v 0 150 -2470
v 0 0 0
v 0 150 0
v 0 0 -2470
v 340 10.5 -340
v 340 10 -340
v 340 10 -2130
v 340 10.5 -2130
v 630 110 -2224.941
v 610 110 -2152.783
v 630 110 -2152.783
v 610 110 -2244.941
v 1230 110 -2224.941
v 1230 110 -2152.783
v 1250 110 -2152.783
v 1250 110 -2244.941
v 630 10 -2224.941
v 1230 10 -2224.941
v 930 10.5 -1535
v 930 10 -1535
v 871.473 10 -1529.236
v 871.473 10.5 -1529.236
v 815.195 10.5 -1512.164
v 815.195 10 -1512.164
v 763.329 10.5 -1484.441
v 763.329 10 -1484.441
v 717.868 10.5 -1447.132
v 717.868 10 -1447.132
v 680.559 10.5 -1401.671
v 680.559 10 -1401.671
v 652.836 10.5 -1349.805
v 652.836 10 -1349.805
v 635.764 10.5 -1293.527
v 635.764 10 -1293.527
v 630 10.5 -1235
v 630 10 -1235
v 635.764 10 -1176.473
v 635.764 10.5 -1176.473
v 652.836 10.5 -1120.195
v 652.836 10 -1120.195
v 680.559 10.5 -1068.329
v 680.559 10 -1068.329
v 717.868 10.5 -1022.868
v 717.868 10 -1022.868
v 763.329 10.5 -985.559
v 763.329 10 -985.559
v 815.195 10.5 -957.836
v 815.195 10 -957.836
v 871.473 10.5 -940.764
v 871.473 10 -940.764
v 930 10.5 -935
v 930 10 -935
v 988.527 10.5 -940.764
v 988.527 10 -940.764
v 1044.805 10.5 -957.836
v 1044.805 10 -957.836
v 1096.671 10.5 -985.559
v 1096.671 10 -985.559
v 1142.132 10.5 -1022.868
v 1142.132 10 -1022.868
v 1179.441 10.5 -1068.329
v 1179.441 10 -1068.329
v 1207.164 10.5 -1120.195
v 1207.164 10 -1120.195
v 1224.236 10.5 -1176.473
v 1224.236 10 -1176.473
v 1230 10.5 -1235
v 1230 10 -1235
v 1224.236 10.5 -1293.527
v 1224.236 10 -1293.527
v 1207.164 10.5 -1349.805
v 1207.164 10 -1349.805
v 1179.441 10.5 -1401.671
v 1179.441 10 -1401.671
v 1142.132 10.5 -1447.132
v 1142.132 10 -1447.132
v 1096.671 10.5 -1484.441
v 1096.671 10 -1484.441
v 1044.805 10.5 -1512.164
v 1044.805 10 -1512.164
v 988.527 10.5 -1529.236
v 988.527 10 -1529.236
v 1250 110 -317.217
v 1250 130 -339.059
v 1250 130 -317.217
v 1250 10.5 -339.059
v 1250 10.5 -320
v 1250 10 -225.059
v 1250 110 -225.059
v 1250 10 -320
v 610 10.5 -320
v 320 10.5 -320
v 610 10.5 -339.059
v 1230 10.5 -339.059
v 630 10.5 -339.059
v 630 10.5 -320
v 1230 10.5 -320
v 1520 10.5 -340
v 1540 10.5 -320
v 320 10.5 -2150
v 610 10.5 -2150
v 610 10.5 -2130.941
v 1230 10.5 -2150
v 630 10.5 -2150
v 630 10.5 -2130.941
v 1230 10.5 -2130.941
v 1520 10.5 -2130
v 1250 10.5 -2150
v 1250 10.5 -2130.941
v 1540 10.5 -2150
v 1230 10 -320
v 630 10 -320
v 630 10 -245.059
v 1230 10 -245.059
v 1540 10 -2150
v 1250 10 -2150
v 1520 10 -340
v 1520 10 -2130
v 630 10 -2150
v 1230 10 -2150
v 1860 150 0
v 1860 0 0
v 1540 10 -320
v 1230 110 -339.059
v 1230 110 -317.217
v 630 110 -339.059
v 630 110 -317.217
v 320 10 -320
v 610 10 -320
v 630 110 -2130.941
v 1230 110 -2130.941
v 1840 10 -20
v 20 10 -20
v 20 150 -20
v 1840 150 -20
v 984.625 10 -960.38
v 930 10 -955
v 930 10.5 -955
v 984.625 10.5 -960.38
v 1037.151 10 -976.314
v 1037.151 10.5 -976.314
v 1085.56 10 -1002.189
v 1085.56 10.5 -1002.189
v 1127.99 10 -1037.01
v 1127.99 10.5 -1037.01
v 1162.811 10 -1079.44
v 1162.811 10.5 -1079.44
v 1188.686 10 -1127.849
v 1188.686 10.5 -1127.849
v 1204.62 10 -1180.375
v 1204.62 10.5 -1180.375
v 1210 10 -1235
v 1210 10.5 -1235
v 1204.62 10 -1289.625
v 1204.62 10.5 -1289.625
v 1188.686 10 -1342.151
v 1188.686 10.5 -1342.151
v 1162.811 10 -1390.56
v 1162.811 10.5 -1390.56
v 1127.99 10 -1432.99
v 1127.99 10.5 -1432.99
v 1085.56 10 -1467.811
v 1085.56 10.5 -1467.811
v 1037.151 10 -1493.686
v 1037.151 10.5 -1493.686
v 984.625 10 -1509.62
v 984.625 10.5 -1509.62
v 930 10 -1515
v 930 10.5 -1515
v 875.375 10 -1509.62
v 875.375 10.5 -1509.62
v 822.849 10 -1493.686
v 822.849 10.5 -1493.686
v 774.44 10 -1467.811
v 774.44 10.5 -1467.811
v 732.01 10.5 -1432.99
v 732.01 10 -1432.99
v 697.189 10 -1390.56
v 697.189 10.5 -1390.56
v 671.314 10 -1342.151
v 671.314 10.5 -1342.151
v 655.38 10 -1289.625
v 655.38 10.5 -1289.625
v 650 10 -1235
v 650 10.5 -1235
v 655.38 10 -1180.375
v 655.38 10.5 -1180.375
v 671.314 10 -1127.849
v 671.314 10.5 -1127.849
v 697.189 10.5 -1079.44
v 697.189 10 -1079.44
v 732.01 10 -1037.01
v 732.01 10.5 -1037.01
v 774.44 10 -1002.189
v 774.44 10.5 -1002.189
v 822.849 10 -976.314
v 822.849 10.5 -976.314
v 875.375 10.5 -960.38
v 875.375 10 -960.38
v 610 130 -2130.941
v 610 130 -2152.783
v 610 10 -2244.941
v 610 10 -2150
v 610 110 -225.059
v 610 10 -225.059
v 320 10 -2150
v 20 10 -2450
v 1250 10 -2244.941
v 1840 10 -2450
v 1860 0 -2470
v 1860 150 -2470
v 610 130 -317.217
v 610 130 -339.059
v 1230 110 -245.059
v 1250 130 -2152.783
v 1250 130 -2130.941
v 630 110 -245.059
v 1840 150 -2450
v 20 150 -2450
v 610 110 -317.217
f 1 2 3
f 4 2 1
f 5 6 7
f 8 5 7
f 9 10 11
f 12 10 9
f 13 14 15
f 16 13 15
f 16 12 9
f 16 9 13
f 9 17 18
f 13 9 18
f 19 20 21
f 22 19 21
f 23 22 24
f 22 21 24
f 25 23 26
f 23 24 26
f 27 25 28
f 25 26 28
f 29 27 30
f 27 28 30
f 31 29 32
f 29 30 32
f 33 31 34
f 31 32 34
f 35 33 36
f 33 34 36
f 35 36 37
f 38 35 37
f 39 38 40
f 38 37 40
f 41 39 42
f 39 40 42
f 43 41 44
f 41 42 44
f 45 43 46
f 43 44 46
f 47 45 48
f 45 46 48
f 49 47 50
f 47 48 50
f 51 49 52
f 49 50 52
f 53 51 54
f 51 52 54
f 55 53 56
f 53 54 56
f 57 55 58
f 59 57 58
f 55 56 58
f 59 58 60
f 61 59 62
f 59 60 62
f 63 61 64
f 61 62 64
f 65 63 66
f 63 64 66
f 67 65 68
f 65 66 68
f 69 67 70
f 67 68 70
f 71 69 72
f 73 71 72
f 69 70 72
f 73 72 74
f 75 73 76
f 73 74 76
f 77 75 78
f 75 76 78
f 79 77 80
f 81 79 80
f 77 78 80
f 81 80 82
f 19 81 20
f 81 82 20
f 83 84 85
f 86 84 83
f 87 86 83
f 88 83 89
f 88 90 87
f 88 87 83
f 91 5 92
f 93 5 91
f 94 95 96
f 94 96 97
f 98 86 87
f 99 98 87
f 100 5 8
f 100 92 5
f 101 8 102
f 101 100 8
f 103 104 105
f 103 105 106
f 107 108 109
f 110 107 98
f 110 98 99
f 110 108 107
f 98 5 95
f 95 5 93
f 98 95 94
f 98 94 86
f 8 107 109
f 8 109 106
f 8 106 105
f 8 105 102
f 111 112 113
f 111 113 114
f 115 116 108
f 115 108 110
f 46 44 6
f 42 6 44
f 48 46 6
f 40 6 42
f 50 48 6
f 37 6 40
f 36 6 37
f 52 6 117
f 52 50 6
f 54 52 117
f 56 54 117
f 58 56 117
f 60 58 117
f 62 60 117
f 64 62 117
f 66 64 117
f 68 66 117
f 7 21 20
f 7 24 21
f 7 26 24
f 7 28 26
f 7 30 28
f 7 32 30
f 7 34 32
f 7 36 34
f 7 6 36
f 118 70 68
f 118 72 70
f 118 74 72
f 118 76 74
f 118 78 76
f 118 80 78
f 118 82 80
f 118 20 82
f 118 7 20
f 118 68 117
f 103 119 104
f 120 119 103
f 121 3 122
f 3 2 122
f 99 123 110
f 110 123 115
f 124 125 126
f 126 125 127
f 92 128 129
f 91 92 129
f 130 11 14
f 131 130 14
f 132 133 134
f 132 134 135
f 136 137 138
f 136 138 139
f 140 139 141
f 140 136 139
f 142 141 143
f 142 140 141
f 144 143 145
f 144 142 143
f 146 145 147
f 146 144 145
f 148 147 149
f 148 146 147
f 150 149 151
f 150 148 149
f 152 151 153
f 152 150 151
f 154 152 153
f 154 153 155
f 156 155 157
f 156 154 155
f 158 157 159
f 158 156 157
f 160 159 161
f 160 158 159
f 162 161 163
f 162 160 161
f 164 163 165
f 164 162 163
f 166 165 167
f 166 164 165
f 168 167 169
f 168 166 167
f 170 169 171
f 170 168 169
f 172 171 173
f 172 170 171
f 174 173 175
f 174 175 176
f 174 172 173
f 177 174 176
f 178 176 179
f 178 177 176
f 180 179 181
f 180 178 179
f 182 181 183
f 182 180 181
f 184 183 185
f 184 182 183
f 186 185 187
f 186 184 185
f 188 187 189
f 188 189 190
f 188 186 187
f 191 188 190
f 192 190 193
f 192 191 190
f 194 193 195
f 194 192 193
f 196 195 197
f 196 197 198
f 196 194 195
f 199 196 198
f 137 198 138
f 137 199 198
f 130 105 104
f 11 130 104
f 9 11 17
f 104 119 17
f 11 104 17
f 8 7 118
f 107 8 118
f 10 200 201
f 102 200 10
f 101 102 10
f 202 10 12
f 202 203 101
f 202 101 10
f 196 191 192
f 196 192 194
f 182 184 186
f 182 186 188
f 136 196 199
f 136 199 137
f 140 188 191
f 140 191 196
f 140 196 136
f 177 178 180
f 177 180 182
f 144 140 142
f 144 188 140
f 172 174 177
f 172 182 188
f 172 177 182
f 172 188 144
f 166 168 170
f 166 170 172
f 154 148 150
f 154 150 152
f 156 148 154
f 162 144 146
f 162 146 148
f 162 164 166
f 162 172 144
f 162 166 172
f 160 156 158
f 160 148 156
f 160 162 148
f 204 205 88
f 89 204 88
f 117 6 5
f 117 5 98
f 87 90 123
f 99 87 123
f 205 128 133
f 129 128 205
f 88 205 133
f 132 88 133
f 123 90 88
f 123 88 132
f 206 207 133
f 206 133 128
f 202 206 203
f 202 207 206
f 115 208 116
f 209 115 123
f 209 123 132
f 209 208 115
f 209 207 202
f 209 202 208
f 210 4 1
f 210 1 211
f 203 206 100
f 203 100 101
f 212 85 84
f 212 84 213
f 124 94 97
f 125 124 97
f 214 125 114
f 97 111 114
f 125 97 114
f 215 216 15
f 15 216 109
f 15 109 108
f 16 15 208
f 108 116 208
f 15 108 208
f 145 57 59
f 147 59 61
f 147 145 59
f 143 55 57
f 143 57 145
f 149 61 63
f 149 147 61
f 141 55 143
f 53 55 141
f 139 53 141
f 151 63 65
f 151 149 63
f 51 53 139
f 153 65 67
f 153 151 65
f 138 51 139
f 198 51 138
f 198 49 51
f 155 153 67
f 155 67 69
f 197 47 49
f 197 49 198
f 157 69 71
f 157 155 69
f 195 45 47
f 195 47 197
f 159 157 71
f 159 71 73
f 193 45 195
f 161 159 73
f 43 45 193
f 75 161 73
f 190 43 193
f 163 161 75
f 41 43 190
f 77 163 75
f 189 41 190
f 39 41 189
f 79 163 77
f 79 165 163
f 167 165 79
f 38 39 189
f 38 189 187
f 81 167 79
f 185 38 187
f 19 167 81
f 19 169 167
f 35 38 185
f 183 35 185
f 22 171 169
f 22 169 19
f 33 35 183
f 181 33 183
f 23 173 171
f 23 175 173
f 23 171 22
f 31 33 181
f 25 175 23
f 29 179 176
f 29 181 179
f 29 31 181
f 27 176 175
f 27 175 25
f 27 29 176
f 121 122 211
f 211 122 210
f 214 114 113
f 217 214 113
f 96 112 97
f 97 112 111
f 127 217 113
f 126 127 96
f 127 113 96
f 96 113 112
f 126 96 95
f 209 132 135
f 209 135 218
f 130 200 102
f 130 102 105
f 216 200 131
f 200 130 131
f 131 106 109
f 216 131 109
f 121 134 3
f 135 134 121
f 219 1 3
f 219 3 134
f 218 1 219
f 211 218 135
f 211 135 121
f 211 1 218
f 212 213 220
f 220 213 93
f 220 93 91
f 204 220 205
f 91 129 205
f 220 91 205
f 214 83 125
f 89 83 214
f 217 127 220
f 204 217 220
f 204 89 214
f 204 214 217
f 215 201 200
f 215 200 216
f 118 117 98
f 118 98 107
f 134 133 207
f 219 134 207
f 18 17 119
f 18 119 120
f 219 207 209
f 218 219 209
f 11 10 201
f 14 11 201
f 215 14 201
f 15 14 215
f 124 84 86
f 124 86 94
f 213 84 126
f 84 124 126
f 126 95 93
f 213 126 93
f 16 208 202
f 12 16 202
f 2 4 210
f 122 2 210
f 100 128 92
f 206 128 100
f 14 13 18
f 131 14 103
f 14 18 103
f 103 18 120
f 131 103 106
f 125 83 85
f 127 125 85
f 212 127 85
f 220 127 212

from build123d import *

# Parameters (mm, degrees)
ESBO_O1_W                = 1860
ESBO_O1_H                = 2470
RESSALTO_EXTRUS_O1_DEPTH = 10
ESBO_O2_W                = 1860
ESBO_O2_H                = 2470
ESBO_O2_W_2              = 1820
ESBO_O2_H_2              = 2430
RESSALTO_EXTRUS_O2_DEPTH = 140
ESBO_O3_W                = 1220
ESBO_O3_H                = 1830
ESBO_O3_W_2              = 1180
ESBO_O3_H_2              = 1790
ESBO_O3_R                = 300
ESBO_O3_R_2              = 280
RESSALTO_EXTRUS_O3_DEPTH = 0.5
RESSALTO_EXTRUS_O4_DEPTH = 100
ESBO_O5_W                = 640
ESBO_O5_H                = 21.841865424
RESSALTO_EXTRUS_O5_DEPTH = 20
PADR_OCIRCULAR1_COUNT    = 2


with BuildPart() as part:
    # Esboço1 → Ressalto-extrusão1 (new body)
    with BuildSketch(Plane(origin=(0, 0, 0), x_dir=(1, 0, 0), z_dir=(0, 1, 0))):
        with Locations((930, 1235)):
            Rectangle(ESBO_O1_W, ESBO_O1_H)
    extrude(amount=RESSALTO_EXTRUS_O1_DEPTH)

    # Esboço2 → Ressalto-extrusão2 (add)
    with BuildSketch(Plane(origin=(0, 10, 0), x_dir=(1, 0, 0), z_dir=(0, 1, 0))):
        with Locations((930, 1235)):
            Rectangle(ESBO_O2_W, ESBO_O2_H)
        with Locations((930, 1235)):
            Rectangle(ESBO_O2_W_2, ESBO_O2_H_2, mode=Mode.SUBTRACT)
    extrude(amount=RESSALTO_EXTRUS_O2_DEPTH)

    # Esboço3 → Ressalto-extrusão3 (add)
    # profile 1 of 2: a face of its own
    with BuildSketch(Plane(origin=(0, 10, 0), x_dir=(1, 0, 0), z_dir=(0, 1, 0))):
        with Locations((930, 1235)):
            Rectangle(ESBO_O3_W, ESBO_O3_H)
        with Locations((930, 1235)):
            Rectangle(ESBO_O3_W_2, ESBO_O3_H_2, mode=Mode.SUBTRACT)
    # profile 2 of 2: a face of its own
    with BuildSketch(Plane(origin=(0, 10, 0), x_dir=(1, 0, 0), z_dir=(0, 1, 0))):
        with Locations(Location((930, 1235, 0), (0, 0, 90))):
            Circle(ESBO_O3_R)
        with Locations(Location((930, 1235, 0), (0, 0, 270))):
            Circle(ESBO_O3_R_2, mode=Mode.SUBTRACT)
    extrude(amount=RESSALTO_EXTRUS_O3_DEPTH)

    # Esboço4 → Ressalto-extrusão4 (add)
    with BuildSketch(Plane(origin=(0, 10, 0), x_dir=(1, 0, 0), z_dir=(0, 1, 0))):
        Polygon((630, 2224.941322865), (1230, 2224.941322865), (1230, 2150.941322865), (1230, 2130.941322865), (1250, 2130.941322865), (1250, 2244.941322865), (610, 2244.941322865), (610, 2130.941322865), (630, 2130.941322865), (630, 2150.941322865), align=None)
    ressalto_extrus_o4 = extrude(amount=RESSALTO_EXTRUS_O4_DEPTH)

    # Esboço5 → Ressalto-extrusão5 (add)
    with BuildSketch(Plane(origin=(0, 110, 0), x_dir=(1, 0, 0), z_dir=(0, 1, 0))):
        with Locations((930, 2141.862255577)):
            Rectangle(ESBO_O5_W, ESBO_O5_H)
    ressalto_extrus_o5 = extrude(amount=RESSALTO_EXTRUS_O5_DEPTH)

    # PadrãoCircular1: Ressalto-extrusão4, Ressalto-extrusão5 ×2 about axis
    padr_ocircular1_axis = Axis((930, 10.5, -1235), (0, 1, 0))
    add([ressalto_extrus_o4.rotate(padr_ocircular1_axis, i * 360 / PADR_OCIRCULAR1_COUNT) for i in range(1, PADR_OCIRCULAR1_COUNT)])
    add([ressalto_extrus_o5.rotate(padr_ocircular1_axis, i * 360 / PADR_OCIRCULAR1_COUNT) for i in range(1, PADR_OCIRCULAR1_COUNT)])


solid = part.part
